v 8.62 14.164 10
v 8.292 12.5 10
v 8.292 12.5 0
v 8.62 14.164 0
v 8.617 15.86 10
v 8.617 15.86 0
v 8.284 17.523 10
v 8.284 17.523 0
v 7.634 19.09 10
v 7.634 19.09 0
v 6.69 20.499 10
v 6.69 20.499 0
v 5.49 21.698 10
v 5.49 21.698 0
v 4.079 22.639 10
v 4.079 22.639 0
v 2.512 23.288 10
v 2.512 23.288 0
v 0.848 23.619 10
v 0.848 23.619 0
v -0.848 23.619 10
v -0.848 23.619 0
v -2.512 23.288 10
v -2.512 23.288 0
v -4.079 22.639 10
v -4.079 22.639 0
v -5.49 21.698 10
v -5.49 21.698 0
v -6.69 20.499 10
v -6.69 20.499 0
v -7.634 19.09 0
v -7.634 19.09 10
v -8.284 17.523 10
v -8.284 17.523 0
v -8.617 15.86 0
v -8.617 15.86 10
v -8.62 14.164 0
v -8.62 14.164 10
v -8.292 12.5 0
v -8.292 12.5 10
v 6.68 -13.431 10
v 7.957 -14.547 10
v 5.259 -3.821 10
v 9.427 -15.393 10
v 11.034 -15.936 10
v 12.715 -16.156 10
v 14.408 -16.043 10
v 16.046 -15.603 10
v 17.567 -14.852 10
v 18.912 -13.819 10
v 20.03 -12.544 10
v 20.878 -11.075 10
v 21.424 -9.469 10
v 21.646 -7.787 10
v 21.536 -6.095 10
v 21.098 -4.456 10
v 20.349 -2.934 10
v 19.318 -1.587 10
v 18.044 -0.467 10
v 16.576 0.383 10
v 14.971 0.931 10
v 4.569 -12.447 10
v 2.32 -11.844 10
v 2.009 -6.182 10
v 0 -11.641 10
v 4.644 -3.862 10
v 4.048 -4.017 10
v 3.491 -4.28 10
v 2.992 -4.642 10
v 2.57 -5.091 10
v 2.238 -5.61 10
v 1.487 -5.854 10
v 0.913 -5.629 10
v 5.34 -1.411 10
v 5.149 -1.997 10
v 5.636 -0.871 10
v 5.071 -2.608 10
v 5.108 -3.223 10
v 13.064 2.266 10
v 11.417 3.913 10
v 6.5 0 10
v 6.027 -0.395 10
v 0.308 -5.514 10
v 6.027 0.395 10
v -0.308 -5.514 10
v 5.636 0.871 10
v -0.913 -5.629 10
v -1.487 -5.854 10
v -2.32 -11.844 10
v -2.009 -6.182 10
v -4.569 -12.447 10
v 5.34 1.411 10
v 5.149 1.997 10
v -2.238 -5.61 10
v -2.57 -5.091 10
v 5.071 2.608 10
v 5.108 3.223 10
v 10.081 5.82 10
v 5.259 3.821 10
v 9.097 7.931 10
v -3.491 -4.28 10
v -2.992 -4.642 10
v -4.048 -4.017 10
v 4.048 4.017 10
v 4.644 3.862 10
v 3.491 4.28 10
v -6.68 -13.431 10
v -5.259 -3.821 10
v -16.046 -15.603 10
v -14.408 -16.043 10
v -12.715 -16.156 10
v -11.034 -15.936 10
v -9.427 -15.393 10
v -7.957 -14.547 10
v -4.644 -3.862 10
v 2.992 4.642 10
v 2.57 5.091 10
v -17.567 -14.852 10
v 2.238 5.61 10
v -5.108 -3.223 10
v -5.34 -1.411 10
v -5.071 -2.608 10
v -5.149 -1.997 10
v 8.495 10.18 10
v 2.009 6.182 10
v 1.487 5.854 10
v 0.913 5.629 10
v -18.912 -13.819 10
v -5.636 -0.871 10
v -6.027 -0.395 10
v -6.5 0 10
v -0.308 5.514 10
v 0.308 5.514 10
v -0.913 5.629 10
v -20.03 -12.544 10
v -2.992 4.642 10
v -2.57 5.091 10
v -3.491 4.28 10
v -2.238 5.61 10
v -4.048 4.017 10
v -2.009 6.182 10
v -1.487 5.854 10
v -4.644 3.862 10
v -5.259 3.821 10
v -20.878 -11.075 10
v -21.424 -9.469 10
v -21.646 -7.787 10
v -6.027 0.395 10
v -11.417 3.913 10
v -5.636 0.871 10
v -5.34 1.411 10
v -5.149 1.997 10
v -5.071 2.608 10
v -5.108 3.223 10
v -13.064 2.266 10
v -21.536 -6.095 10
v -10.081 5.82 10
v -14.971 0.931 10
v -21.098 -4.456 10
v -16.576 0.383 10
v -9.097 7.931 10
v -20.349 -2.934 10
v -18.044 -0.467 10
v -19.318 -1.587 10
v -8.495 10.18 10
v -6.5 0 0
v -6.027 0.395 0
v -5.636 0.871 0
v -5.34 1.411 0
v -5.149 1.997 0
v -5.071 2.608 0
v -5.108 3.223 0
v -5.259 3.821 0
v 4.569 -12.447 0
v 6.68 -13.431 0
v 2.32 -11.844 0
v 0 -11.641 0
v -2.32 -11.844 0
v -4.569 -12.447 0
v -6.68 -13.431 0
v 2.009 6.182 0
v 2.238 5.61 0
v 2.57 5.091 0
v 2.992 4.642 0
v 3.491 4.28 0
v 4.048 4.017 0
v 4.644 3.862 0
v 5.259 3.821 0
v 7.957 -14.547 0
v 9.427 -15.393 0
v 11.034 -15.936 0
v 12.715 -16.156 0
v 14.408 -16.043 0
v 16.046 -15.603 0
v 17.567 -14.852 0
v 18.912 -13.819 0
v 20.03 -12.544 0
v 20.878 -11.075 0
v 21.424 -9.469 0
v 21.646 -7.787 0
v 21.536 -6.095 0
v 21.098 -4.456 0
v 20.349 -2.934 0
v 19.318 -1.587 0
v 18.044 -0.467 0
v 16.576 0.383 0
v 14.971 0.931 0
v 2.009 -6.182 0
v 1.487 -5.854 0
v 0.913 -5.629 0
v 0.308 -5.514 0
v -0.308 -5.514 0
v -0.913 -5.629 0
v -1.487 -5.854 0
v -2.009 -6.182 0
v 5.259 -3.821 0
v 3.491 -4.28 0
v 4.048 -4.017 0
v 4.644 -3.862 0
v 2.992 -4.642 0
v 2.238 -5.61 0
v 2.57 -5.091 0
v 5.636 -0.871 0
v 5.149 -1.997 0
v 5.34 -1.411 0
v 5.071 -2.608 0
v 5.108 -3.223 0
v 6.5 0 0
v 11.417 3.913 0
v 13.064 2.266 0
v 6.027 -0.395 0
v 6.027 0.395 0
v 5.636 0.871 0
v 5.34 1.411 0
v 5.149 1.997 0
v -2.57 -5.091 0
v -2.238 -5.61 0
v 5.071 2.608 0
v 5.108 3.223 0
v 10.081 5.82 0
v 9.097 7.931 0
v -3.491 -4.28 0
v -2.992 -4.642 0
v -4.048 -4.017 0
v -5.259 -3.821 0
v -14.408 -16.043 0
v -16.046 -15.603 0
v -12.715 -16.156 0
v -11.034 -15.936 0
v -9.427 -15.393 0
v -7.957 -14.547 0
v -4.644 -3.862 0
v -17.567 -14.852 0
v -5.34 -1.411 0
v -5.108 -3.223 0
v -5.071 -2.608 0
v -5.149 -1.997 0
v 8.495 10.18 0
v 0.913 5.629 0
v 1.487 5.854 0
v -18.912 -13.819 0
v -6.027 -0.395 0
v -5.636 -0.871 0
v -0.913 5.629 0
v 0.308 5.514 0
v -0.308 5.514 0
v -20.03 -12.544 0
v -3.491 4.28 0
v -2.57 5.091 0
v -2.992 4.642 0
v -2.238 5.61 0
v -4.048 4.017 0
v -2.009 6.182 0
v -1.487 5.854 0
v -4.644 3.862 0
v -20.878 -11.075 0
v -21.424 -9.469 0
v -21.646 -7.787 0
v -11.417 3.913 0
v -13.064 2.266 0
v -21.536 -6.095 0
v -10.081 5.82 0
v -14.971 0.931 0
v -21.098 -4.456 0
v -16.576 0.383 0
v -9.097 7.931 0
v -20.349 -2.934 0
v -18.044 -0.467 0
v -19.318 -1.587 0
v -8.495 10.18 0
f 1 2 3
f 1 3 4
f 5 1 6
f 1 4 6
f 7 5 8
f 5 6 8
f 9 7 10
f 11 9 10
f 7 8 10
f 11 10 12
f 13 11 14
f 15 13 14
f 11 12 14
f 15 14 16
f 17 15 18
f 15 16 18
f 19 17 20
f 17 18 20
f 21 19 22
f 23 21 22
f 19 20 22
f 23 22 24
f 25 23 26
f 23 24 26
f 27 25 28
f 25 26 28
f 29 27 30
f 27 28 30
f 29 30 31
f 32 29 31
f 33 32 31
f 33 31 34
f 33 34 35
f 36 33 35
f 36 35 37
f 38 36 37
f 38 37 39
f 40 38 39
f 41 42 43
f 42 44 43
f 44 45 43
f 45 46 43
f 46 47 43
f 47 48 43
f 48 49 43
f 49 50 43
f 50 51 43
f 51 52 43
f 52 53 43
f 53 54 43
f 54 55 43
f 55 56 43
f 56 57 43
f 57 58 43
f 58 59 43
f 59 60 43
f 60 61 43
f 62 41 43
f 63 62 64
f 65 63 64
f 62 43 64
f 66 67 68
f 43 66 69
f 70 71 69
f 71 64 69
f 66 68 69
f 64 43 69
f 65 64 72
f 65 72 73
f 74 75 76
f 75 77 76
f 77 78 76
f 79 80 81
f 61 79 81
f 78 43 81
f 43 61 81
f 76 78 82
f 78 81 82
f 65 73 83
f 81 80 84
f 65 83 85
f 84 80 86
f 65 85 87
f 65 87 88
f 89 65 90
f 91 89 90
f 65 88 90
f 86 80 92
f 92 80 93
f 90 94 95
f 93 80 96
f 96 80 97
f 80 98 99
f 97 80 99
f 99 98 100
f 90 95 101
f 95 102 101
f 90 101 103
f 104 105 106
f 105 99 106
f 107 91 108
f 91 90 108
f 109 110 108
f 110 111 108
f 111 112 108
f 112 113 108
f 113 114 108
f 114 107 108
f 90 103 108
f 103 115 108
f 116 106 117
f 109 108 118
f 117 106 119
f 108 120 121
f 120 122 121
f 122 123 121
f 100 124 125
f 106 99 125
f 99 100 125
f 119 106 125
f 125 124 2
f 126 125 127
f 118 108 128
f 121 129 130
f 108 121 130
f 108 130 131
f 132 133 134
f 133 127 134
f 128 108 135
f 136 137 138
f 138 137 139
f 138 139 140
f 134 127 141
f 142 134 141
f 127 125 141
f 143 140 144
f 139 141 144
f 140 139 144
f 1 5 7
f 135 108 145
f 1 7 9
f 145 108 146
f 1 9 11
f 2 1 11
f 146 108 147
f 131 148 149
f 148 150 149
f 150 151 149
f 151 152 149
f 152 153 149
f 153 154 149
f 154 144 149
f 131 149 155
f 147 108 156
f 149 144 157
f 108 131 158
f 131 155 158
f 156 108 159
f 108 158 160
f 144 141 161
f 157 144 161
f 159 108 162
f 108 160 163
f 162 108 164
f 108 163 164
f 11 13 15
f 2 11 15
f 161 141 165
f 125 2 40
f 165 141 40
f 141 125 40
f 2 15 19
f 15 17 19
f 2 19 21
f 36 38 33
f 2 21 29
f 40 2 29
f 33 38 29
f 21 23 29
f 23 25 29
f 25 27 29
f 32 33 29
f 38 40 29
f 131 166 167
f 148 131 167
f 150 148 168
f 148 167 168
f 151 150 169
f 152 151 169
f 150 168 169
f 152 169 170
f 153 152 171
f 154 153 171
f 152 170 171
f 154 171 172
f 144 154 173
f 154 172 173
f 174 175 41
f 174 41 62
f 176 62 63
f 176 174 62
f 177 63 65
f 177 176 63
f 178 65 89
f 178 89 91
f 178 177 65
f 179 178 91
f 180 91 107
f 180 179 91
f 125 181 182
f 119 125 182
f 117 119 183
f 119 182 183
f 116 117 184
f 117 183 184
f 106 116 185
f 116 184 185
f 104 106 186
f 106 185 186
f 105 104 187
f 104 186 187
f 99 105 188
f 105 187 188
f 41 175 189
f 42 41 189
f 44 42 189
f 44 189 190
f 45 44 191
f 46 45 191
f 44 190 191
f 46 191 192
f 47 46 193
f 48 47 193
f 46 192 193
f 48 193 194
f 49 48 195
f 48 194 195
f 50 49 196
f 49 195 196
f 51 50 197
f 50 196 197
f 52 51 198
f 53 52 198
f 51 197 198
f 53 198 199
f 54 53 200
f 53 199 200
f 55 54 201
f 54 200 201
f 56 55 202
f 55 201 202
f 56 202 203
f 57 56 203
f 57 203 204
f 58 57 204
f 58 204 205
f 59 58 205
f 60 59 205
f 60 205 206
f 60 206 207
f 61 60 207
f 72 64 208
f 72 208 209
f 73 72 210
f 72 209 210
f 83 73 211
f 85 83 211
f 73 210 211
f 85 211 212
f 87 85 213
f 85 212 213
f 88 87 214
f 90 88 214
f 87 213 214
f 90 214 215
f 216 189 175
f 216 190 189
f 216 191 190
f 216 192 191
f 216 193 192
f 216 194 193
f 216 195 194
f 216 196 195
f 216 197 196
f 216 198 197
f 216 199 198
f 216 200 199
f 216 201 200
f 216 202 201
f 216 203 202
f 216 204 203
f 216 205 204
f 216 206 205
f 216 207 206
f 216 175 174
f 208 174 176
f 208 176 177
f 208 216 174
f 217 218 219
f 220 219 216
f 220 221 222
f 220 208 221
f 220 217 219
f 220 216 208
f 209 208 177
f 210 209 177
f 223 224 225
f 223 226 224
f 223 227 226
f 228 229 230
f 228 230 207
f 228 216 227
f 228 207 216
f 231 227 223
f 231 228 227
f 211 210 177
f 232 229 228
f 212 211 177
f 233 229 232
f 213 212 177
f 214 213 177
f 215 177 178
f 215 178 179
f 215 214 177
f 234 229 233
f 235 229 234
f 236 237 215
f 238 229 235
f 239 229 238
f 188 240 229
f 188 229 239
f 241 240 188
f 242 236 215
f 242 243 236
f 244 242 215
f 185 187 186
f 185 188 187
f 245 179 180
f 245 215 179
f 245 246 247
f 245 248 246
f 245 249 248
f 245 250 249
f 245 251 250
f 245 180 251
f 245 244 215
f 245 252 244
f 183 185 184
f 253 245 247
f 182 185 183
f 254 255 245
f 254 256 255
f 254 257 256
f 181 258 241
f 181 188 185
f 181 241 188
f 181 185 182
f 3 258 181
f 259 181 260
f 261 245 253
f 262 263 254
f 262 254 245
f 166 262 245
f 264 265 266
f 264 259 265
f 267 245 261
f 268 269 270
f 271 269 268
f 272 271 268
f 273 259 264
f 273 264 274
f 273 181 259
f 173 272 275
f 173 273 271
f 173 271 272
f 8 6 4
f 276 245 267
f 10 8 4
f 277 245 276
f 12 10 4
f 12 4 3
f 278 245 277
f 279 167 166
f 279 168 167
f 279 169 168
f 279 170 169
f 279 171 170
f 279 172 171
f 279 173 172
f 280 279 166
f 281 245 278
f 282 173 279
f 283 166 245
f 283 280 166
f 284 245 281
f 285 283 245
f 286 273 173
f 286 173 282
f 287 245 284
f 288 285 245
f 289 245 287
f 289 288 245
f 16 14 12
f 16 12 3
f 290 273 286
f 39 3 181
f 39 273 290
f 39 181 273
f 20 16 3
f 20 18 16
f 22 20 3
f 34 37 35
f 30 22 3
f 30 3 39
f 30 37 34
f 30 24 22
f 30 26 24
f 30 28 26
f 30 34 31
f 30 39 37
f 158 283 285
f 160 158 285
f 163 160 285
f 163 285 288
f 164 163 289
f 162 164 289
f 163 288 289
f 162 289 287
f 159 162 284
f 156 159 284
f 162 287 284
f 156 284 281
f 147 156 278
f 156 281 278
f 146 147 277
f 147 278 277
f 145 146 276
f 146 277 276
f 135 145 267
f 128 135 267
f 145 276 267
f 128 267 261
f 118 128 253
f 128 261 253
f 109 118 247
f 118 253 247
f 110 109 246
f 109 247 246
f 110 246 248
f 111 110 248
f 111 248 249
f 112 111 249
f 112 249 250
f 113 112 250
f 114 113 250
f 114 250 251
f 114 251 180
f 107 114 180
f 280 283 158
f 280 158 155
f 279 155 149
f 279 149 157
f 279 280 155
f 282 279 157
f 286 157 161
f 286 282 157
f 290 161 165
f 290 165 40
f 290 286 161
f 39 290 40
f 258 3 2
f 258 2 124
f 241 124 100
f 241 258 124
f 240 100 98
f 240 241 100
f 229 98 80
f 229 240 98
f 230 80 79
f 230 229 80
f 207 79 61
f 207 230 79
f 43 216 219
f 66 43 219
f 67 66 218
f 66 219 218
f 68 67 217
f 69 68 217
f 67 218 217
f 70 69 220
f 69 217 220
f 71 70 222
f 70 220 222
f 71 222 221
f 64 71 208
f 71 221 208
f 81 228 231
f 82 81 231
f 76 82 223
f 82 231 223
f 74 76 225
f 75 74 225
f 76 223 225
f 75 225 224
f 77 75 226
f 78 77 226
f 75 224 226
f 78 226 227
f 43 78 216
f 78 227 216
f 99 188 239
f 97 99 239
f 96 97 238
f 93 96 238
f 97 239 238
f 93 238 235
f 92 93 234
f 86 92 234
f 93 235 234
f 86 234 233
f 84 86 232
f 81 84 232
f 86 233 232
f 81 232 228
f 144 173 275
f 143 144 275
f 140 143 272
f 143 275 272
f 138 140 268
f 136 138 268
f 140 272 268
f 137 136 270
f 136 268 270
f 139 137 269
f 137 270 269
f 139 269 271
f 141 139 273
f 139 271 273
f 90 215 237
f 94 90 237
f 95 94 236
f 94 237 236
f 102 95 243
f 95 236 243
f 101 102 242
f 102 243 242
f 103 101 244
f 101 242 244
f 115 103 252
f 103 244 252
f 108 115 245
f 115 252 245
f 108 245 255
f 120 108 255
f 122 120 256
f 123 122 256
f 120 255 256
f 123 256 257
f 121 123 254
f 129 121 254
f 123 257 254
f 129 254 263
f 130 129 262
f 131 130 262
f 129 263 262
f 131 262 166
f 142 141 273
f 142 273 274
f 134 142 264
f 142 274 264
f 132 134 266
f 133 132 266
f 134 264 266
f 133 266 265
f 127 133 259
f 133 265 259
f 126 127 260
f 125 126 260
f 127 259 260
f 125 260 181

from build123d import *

# Parameters (mm, degrees)
PAD_DEPTH = 10


with BuildPart() as part:
    # Sketch → Pad (new body)
    with BuildSketch(Plane.XY):
        with BuildLine():
            ThreePointArc((8.291561, 12.500001), (10.081337, 5.820463), (14.971099, 0.930702))
            ThreePointArc((6.679538, -13.430703), (20.49038, -11.830126), (14.971099, 0.930702))
            ThreePointArc((6.679538, -13.430703), (0, -11.640926), (-6.679538, -13.430703))
            ThreePointArc((-14.971099, 0.930702), (-20.49038, -11.830126), (-6.679538, -13.430703))
            ThreePointArc((-14.971099, 0.930702), (-10.081337, 5.820463), (-8.291561, 12.500001))
            ThreePointArc((8.291561, 12.500001), (0, 23.660253), (-8.291561, 12.500001))
        make_face()
        with BuildLine():
            ThreePointArc((-6.5, 0), (-5.230811, 1.699593), (-5.25861, 3.820604))
            ThreePointArc((-5.25861, 3.820604), (-3.232819, 4.449593), (-2.00861, 6.181867))
            ThreePointArc((-2.00861, 6.181867), (0, 5.5), (2.00861, 6.181867))
            ThreePointArc((2.00861, 6.181867), (3.232819, 4.449593), (5.25861, 3.820604))
            ThreePointArc((5.25861, 3.820604), (5.230811, 1.699593), (6.5, 0))
            ThreePointArc((6.5, 0), (5.230811, -1.699593), (5.25861, -3.820604))
            ThreePointArc((5.25861, -3.820604), (3.232819, -4.449593), (2.00861, -6.181867))
            ThreePointArc((2.00861, -6.181867), (0, -5.5), (-2.00861, -6.181867))
            ThreePointArc((-2.00861, -6.181867), (-3.232819, -4.449593), (-5.25861, -3.820604))
            ThreePointArc((-5.25861, -3.820604), (-5.230811, -1.699593), (-6.5, 0))
        make_face(mode=Mode.SUBTRACT)
    extrude(amount=PAD_DEPTH)


solid = part.part
